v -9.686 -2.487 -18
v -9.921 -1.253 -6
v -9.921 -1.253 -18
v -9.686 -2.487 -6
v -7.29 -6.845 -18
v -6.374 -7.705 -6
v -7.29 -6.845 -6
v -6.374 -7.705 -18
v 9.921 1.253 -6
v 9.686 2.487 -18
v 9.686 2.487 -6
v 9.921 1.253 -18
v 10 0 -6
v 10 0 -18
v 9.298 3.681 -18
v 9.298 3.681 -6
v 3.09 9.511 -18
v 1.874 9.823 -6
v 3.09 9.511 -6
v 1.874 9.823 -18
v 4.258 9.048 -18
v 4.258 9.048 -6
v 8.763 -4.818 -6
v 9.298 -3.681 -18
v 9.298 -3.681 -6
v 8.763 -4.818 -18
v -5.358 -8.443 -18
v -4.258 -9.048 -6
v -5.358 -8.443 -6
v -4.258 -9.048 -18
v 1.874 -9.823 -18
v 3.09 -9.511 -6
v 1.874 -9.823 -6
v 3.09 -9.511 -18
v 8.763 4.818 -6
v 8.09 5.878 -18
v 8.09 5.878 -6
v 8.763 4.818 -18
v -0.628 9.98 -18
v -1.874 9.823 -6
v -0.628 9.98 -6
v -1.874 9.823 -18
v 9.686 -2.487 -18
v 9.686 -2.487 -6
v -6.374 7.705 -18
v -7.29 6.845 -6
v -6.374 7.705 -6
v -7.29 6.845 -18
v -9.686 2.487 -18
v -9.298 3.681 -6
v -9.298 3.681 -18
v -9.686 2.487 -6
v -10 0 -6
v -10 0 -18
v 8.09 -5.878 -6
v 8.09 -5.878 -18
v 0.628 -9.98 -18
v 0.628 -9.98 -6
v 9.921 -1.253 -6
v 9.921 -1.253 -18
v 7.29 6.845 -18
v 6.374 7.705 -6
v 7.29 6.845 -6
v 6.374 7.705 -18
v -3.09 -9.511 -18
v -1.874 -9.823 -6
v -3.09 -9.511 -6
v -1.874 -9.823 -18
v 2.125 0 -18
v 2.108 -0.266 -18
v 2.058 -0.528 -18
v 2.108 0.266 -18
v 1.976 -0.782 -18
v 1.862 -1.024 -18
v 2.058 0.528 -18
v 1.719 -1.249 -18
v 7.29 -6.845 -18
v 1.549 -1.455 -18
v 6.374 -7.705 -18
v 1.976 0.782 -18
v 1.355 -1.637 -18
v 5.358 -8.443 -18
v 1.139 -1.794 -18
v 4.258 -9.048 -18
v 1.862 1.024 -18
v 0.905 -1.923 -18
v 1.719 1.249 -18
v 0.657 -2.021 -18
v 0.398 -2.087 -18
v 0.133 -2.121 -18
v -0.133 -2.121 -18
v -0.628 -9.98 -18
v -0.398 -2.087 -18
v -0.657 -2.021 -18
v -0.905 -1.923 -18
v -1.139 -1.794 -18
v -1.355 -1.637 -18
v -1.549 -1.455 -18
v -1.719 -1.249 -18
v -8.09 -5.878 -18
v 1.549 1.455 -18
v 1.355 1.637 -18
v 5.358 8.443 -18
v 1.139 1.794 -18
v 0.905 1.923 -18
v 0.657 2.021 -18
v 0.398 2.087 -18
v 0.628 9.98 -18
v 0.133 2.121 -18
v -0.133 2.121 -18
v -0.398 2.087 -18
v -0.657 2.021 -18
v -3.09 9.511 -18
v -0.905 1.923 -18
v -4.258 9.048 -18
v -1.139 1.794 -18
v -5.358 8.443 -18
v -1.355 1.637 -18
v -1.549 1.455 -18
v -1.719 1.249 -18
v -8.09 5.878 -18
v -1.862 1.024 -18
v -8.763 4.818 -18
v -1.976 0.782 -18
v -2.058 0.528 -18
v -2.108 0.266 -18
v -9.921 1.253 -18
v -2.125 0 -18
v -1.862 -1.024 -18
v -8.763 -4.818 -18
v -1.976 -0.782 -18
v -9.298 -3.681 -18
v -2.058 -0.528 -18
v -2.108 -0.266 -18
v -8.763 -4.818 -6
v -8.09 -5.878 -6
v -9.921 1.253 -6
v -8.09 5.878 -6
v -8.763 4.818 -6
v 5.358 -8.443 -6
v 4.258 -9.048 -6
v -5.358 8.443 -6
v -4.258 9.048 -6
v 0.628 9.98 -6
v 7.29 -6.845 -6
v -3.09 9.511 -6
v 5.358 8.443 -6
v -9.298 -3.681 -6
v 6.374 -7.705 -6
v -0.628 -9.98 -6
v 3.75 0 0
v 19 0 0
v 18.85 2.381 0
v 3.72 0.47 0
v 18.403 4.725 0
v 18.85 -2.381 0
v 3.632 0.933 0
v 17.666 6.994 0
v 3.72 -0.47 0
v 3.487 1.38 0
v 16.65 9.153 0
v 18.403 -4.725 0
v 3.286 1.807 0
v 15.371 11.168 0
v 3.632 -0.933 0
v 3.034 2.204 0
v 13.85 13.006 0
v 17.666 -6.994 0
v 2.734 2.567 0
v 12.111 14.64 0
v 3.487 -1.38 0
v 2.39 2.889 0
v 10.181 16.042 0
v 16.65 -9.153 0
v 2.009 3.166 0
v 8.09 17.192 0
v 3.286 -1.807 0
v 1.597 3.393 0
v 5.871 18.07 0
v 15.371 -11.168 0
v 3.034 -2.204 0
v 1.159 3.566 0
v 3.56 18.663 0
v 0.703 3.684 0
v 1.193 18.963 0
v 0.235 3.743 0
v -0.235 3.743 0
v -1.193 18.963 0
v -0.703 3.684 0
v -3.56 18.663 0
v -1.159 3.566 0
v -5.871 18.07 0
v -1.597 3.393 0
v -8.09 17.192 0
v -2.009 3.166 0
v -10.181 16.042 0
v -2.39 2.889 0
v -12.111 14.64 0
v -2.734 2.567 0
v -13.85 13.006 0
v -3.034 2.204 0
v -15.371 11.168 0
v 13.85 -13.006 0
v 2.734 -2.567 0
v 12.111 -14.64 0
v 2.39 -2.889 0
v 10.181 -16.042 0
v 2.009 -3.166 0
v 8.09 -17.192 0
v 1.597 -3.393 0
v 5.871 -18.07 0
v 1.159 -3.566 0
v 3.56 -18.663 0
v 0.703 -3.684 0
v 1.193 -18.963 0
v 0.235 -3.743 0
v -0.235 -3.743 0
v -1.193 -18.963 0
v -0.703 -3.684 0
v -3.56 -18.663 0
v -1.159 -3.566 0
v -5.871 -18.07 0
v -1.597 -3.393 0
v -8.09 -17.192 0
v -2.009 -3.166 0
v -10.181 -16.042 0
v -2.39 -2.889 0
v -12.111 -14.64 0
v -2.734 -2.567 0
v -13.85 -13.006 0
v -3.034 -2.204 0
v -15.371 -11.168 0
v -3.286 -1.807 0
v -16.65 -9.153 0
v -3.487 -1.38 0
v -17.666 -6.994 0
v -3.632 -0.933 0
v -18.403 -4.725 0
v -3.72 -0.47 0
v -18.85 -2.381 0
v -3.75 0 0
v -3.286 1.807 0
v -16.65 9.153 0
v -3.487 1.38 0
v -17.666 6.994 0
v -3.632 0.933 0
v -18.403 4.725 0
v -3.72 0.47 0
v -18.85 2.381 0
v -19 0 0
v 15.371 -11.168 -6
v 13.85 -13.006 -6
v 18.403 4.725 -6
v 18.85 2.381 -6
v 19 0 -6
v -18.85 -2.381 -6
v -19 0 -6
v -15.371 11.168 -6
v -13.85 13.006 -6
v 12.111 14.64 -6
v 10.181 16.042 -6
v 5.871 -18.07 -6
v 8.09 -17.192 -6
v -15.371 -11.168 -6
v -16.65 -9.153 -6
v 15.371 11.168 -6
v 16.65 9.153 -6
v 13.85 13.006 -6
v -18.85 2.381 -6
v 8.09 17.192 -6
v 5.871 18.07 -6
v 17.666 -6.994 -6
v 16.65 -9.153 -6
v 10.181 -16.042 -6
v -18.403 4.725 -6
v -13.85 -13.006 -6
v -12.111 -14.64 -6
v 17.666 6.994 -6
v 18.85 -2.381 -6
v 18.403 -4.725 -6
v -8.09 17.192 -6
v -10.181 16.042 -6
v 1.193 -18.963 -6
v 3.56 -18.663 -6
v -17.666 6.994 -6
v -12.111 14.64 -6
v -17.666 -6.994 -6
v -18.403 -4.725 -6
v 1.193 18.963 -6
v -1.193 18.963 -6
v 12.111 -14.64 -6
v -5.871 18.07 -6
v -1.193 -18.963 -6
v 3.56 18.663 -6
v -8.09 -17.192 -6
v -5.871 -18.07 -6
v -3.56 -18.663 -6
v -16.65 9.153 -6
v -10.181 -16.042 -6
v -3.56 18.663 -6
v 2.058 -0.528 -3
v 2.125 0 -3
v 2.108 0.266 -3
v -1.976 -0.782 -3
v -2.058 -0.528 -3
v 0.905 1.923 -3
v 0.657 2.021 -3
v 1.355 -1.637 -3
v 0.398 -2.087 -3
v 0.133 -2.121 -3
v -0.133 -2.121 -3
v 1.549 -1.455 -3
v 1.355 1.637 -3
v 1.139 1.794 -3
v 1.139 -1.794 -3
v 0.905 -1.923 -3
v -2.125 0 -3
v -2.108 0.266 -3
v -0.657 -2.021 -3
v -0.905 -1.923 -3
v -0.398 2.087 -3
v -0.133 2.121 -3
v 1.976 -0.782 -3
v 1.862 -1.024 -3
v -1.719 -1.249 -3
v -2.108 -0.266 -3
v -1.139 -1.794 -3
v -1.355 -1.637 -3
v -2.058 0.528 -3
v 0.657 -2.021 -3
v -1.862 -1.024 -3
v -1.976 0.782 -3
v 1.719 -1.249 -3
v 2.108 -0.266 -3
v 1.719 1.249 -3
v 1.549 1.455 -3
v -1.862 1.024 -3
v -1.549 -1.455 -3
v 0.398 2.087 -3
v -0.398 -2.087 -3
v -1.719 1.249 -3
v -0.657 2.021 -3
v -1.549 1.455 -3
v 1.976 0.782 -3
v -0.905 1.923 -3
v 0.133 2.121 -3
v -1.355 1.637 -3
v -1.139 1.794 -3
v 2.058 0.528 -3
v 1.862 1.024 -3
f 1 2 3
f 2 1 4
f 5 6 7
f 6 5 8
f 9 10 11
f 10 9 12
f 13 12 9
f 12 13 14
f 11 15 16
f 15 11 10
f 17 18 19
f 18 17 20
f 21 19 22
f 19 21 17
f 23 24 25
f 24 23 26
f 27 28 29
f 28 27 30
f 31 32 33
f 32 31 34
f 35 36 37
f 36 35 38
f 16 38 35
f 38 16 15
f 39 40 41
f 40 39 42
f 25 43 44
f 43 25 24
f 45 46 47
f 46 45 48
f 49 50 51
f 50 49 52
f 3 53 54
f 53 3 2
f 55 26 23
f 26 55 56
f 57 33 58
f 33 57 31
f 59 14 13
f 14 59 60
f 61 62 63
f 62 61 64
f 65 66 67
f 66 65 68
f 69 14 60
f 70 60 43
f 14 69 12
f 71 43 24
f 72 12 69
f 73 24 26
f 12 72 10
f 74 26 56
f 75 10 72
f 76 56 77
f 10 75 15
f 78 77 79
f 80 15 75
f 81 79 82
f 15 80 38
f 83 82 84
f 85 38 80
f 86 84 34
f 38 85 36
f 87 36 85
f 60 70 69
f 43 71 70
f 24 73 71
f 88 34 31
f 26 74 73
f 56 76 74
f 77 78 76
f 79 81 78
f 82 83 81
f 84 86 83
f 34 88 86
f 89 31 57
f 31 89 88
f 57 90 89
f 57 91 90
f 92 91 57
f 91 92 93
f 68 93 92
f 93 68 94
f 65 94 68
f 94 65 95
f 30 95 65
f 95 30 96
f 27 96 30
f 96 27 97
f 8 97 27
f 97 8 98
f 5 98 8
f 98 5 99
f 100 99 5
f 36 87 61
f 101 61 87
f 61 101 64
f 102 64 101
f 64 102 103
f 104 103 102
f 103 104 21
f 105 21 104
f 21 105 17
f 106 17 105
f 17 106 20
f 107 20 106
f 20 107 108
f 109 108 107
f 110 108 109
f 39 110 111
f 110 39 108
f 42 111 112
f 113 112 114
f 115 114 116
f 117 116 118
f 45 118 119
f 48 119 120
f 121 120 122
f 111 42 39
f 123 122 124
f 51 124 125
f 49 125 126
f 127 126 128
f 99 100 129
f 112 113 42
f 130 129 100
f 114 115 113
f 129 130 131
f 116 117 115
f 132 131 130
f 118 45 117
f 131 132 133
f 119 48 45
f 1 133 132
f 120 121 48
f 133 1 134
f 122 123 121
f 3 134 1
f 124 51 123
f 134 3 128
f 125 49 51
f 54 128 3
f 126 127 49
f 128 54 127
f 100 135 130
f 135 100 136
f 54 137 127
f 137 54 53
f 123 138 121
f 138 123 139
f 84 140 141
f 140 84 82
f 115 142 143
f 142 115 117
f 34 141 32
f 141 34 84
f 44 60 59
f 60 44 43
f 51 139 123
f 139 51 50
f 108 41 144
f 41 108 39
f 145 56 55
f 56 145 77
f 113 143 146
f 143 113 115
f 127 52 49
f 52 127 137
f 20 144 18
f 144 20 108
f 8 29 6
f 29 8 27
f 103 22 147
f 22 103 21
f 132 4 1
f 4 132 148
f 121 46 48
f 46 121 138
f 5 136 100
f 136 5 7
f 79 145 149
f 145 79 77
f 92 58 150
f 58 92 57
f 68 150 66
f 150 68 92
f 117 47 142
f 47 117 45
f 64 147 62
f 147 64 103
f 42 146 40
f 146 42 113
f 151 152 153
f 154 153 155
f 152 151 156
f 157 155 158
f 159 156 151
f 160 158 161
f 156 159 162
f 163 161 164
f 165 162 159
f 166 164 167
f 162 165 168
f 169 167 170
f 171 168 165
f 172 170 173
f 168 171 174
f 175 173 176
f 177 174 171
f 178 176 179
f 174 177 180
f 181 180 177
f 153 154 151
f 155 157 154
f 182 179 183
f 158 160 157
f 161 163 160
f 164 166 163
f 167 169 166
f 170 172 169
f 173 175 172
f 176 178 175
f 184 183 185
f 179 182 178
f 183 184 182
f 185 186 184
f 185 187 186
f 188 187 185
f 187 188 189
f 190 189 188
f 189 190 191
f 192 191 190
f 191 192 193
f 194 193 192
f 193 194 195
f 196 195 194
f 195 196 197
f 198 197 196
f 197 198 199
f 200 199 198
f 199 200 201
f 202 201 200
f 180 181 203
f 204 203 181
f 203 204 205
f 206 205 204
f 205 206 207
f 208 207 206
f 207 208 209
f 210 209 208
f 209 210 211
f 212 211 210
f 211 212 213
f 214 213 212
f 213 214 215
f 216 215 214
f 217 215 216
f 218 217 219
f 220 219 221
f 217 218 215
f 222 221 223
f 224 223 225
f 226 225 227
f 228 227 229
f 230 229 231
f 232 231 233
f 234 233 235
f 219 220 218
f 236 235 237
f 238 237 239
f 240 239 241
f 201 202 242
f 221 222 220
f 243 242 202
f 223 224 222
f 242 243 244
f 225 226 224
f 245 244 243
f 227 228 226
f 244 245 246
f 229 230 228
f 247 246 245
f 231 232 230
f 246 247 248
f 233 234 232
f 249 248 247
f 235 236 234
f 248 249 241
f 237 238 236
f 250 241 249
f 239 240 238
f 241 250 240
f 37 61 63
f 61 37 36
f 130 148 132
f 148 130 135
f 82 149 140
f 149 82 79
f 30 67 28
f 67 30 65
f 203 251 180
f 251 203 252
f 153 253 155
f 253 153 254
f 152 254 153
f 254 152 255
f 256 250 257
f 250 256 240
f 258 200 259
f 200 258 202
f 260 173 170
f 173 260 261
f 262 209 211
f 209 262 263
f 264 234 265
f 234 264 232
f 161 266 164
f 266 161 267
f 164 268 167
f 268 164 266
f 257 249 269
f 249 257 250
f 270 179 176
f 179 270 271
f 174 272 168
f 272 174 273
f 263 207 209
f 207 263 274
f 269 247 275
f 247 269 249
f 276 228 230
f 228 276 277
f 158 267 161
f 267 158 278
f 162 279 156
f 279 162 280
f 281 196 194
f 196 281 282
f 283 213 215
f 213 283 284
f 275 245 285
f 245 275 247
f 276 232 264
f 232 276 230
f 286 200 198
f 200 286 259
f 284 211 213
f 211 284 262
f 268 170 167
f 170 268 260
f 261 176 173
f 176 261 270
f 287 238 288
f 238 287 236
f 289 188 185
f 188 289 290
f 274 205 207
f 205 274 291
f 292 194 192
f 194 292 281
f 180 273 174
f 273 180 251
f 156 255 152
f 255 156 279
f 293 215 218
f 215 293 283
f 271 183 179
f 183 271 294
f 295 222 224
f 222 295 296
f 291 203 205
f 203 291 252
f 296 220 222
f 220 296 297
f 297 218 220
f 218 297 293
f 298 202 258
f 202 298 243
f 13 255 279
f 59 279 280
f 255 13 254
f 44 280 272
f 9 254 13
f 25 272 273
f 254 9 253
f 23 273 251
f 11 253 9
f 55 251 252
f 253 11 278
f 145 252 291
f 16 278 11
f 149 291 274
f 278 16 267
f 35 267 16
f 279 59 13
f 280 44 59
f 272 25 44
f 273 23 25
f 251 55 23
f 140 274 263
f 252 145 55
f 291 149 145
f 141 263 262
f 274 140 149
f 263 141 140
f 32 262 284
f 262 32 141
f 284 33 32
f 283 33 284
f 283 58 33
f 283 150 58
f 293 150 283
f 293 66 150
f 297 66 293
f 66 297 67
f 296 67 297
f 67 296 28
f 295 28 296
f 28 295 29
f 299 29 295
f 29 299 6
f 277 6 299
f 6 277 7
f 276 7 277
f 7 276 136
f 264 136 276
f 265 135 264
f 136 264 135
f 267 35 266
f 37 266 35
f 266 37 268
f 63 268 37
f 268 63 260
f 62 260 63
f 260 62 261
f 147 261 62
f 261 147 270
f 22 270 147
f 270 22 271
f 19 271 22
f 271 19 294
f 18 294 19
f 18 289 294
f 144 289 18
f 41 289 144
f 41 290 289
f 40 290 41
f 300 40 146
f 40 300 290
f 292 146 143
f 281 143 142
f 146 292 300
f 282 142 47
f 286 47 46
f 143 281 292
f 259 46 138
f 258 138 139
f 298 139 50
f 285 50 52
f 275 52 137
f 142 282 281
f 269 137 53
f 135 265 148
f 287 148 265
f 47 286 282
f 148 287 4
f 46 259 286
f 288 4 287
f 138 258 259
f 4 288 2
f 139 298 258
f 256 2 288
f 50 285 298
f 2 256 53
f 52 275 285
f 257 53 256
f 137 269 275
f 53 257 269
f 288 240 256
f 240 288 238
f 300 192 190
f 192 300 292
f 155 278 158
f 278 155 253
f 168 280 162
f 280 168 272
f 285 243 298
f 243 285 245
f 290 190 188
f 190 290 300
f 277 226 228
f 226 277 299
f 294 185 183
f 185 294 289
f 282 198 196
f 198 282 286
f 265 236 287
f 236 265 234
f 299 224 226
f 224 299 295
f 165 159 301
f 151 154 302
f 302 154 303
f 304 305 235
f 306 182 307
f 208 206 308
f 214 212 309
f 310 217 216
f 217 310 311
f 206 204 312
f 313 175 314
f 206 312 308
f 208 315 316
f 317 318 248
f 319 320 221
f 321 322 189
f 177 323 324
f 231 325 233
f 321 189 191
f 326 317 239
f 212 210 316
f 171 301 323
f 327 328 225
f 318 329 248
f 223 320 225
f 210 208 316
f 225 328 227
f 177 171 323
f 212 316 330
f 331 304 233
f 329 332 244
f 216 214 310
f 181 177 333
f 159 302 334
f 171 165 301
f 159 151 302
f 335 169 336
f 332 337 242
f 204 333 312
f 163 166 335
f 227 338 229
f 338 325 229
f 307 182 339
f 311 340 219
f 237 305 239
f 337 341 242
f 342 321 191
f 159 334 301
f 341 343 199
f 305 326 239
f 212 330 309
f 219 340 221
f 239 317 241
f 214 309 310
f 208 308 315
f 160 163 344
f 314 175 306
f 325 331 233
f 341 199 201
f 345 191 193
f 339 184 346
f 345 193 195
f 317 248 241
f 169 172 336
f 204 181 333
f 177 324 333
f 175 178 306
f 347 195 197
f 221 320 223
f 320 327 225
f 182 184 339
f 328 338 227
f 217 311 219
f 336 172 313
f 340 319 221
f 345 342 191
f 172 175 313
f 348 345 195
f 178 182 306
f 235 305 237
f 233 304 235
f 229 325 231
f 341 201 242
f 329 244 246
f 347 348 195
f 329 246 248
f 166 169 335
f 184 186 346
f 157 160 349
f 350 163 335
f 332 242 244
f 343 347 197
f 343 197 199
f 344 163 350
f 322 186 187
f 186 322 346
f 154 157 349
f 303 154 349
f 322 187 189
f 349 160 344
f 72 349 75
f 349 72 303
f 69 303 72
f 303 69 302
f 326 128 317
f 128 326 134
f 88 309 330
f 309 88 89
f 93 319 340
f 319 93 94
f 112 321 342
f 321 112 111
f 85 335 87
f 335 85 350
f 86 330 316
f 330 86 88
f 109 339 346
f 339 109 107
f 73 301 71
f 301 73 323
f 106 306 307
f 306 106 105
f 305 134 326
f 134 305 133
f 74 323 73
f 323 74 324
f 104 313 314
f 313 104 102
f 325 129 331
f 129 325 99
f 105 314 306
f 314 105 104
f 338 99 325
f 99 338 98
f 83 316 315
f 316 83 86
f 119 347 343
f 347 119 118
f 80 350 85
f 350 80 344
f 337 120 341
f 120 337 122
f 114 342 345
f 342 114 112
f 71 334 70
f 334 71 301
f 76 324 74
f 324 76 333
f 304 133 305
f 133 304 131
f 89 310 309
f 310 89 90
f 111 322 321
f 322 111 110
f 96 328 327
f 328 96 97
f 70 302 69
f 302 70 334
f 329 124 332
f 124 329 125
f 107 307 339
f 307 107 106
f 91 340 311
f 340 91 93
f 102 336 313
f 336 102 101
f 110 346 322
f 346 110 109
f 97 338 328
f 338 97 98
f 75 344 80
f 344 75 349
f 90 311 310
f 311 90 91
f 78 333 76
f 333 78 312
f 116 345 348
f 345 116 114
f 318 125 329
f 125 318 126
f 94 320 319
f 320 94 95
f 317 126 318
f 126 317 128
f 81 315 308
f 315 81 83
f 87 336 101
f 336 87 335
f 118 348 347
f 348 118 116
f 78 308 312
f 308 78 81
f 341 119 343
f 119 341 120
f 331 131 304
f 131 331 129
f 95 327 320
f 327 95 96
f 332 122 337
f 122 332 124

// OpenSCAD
$fn = 50;


difference() {
	union() {
		translate(v = [0, 0, -18.0000000000]) {
			cylinder(h = 18, r = 10.0000000000);
		}
		translate(v = [0, 0, -6.0000000000]) {
			cylinder(h = 6, r = 19.0000000000);
		}
	}
	union() {
		translate(v = [0, 0, 0]) {
			rotate(a = [0, 0, 0]) {
				difference() {
					union() {
						#translate(v = [0, 0, -18.0000000000]) {
							cylinder(h = 18, r = 2.0000000000);
						}
						#translate(v = [0, 0, -3]) {
							cylinder(h = 3, r1 = 2.1250000000, r2 = 3.7500000000);
						}
						#translate(v = [0, 0, -18.0000000000]) {
							cylinder(h = 18, r = 2.1250000000);
						}
						#translate(v = [0, 0, -18.0000000000]) {
							cylinder(h = 18, r = 2.0000000000);
						}
					}
					union();
				}
			}
		}
	}
}
